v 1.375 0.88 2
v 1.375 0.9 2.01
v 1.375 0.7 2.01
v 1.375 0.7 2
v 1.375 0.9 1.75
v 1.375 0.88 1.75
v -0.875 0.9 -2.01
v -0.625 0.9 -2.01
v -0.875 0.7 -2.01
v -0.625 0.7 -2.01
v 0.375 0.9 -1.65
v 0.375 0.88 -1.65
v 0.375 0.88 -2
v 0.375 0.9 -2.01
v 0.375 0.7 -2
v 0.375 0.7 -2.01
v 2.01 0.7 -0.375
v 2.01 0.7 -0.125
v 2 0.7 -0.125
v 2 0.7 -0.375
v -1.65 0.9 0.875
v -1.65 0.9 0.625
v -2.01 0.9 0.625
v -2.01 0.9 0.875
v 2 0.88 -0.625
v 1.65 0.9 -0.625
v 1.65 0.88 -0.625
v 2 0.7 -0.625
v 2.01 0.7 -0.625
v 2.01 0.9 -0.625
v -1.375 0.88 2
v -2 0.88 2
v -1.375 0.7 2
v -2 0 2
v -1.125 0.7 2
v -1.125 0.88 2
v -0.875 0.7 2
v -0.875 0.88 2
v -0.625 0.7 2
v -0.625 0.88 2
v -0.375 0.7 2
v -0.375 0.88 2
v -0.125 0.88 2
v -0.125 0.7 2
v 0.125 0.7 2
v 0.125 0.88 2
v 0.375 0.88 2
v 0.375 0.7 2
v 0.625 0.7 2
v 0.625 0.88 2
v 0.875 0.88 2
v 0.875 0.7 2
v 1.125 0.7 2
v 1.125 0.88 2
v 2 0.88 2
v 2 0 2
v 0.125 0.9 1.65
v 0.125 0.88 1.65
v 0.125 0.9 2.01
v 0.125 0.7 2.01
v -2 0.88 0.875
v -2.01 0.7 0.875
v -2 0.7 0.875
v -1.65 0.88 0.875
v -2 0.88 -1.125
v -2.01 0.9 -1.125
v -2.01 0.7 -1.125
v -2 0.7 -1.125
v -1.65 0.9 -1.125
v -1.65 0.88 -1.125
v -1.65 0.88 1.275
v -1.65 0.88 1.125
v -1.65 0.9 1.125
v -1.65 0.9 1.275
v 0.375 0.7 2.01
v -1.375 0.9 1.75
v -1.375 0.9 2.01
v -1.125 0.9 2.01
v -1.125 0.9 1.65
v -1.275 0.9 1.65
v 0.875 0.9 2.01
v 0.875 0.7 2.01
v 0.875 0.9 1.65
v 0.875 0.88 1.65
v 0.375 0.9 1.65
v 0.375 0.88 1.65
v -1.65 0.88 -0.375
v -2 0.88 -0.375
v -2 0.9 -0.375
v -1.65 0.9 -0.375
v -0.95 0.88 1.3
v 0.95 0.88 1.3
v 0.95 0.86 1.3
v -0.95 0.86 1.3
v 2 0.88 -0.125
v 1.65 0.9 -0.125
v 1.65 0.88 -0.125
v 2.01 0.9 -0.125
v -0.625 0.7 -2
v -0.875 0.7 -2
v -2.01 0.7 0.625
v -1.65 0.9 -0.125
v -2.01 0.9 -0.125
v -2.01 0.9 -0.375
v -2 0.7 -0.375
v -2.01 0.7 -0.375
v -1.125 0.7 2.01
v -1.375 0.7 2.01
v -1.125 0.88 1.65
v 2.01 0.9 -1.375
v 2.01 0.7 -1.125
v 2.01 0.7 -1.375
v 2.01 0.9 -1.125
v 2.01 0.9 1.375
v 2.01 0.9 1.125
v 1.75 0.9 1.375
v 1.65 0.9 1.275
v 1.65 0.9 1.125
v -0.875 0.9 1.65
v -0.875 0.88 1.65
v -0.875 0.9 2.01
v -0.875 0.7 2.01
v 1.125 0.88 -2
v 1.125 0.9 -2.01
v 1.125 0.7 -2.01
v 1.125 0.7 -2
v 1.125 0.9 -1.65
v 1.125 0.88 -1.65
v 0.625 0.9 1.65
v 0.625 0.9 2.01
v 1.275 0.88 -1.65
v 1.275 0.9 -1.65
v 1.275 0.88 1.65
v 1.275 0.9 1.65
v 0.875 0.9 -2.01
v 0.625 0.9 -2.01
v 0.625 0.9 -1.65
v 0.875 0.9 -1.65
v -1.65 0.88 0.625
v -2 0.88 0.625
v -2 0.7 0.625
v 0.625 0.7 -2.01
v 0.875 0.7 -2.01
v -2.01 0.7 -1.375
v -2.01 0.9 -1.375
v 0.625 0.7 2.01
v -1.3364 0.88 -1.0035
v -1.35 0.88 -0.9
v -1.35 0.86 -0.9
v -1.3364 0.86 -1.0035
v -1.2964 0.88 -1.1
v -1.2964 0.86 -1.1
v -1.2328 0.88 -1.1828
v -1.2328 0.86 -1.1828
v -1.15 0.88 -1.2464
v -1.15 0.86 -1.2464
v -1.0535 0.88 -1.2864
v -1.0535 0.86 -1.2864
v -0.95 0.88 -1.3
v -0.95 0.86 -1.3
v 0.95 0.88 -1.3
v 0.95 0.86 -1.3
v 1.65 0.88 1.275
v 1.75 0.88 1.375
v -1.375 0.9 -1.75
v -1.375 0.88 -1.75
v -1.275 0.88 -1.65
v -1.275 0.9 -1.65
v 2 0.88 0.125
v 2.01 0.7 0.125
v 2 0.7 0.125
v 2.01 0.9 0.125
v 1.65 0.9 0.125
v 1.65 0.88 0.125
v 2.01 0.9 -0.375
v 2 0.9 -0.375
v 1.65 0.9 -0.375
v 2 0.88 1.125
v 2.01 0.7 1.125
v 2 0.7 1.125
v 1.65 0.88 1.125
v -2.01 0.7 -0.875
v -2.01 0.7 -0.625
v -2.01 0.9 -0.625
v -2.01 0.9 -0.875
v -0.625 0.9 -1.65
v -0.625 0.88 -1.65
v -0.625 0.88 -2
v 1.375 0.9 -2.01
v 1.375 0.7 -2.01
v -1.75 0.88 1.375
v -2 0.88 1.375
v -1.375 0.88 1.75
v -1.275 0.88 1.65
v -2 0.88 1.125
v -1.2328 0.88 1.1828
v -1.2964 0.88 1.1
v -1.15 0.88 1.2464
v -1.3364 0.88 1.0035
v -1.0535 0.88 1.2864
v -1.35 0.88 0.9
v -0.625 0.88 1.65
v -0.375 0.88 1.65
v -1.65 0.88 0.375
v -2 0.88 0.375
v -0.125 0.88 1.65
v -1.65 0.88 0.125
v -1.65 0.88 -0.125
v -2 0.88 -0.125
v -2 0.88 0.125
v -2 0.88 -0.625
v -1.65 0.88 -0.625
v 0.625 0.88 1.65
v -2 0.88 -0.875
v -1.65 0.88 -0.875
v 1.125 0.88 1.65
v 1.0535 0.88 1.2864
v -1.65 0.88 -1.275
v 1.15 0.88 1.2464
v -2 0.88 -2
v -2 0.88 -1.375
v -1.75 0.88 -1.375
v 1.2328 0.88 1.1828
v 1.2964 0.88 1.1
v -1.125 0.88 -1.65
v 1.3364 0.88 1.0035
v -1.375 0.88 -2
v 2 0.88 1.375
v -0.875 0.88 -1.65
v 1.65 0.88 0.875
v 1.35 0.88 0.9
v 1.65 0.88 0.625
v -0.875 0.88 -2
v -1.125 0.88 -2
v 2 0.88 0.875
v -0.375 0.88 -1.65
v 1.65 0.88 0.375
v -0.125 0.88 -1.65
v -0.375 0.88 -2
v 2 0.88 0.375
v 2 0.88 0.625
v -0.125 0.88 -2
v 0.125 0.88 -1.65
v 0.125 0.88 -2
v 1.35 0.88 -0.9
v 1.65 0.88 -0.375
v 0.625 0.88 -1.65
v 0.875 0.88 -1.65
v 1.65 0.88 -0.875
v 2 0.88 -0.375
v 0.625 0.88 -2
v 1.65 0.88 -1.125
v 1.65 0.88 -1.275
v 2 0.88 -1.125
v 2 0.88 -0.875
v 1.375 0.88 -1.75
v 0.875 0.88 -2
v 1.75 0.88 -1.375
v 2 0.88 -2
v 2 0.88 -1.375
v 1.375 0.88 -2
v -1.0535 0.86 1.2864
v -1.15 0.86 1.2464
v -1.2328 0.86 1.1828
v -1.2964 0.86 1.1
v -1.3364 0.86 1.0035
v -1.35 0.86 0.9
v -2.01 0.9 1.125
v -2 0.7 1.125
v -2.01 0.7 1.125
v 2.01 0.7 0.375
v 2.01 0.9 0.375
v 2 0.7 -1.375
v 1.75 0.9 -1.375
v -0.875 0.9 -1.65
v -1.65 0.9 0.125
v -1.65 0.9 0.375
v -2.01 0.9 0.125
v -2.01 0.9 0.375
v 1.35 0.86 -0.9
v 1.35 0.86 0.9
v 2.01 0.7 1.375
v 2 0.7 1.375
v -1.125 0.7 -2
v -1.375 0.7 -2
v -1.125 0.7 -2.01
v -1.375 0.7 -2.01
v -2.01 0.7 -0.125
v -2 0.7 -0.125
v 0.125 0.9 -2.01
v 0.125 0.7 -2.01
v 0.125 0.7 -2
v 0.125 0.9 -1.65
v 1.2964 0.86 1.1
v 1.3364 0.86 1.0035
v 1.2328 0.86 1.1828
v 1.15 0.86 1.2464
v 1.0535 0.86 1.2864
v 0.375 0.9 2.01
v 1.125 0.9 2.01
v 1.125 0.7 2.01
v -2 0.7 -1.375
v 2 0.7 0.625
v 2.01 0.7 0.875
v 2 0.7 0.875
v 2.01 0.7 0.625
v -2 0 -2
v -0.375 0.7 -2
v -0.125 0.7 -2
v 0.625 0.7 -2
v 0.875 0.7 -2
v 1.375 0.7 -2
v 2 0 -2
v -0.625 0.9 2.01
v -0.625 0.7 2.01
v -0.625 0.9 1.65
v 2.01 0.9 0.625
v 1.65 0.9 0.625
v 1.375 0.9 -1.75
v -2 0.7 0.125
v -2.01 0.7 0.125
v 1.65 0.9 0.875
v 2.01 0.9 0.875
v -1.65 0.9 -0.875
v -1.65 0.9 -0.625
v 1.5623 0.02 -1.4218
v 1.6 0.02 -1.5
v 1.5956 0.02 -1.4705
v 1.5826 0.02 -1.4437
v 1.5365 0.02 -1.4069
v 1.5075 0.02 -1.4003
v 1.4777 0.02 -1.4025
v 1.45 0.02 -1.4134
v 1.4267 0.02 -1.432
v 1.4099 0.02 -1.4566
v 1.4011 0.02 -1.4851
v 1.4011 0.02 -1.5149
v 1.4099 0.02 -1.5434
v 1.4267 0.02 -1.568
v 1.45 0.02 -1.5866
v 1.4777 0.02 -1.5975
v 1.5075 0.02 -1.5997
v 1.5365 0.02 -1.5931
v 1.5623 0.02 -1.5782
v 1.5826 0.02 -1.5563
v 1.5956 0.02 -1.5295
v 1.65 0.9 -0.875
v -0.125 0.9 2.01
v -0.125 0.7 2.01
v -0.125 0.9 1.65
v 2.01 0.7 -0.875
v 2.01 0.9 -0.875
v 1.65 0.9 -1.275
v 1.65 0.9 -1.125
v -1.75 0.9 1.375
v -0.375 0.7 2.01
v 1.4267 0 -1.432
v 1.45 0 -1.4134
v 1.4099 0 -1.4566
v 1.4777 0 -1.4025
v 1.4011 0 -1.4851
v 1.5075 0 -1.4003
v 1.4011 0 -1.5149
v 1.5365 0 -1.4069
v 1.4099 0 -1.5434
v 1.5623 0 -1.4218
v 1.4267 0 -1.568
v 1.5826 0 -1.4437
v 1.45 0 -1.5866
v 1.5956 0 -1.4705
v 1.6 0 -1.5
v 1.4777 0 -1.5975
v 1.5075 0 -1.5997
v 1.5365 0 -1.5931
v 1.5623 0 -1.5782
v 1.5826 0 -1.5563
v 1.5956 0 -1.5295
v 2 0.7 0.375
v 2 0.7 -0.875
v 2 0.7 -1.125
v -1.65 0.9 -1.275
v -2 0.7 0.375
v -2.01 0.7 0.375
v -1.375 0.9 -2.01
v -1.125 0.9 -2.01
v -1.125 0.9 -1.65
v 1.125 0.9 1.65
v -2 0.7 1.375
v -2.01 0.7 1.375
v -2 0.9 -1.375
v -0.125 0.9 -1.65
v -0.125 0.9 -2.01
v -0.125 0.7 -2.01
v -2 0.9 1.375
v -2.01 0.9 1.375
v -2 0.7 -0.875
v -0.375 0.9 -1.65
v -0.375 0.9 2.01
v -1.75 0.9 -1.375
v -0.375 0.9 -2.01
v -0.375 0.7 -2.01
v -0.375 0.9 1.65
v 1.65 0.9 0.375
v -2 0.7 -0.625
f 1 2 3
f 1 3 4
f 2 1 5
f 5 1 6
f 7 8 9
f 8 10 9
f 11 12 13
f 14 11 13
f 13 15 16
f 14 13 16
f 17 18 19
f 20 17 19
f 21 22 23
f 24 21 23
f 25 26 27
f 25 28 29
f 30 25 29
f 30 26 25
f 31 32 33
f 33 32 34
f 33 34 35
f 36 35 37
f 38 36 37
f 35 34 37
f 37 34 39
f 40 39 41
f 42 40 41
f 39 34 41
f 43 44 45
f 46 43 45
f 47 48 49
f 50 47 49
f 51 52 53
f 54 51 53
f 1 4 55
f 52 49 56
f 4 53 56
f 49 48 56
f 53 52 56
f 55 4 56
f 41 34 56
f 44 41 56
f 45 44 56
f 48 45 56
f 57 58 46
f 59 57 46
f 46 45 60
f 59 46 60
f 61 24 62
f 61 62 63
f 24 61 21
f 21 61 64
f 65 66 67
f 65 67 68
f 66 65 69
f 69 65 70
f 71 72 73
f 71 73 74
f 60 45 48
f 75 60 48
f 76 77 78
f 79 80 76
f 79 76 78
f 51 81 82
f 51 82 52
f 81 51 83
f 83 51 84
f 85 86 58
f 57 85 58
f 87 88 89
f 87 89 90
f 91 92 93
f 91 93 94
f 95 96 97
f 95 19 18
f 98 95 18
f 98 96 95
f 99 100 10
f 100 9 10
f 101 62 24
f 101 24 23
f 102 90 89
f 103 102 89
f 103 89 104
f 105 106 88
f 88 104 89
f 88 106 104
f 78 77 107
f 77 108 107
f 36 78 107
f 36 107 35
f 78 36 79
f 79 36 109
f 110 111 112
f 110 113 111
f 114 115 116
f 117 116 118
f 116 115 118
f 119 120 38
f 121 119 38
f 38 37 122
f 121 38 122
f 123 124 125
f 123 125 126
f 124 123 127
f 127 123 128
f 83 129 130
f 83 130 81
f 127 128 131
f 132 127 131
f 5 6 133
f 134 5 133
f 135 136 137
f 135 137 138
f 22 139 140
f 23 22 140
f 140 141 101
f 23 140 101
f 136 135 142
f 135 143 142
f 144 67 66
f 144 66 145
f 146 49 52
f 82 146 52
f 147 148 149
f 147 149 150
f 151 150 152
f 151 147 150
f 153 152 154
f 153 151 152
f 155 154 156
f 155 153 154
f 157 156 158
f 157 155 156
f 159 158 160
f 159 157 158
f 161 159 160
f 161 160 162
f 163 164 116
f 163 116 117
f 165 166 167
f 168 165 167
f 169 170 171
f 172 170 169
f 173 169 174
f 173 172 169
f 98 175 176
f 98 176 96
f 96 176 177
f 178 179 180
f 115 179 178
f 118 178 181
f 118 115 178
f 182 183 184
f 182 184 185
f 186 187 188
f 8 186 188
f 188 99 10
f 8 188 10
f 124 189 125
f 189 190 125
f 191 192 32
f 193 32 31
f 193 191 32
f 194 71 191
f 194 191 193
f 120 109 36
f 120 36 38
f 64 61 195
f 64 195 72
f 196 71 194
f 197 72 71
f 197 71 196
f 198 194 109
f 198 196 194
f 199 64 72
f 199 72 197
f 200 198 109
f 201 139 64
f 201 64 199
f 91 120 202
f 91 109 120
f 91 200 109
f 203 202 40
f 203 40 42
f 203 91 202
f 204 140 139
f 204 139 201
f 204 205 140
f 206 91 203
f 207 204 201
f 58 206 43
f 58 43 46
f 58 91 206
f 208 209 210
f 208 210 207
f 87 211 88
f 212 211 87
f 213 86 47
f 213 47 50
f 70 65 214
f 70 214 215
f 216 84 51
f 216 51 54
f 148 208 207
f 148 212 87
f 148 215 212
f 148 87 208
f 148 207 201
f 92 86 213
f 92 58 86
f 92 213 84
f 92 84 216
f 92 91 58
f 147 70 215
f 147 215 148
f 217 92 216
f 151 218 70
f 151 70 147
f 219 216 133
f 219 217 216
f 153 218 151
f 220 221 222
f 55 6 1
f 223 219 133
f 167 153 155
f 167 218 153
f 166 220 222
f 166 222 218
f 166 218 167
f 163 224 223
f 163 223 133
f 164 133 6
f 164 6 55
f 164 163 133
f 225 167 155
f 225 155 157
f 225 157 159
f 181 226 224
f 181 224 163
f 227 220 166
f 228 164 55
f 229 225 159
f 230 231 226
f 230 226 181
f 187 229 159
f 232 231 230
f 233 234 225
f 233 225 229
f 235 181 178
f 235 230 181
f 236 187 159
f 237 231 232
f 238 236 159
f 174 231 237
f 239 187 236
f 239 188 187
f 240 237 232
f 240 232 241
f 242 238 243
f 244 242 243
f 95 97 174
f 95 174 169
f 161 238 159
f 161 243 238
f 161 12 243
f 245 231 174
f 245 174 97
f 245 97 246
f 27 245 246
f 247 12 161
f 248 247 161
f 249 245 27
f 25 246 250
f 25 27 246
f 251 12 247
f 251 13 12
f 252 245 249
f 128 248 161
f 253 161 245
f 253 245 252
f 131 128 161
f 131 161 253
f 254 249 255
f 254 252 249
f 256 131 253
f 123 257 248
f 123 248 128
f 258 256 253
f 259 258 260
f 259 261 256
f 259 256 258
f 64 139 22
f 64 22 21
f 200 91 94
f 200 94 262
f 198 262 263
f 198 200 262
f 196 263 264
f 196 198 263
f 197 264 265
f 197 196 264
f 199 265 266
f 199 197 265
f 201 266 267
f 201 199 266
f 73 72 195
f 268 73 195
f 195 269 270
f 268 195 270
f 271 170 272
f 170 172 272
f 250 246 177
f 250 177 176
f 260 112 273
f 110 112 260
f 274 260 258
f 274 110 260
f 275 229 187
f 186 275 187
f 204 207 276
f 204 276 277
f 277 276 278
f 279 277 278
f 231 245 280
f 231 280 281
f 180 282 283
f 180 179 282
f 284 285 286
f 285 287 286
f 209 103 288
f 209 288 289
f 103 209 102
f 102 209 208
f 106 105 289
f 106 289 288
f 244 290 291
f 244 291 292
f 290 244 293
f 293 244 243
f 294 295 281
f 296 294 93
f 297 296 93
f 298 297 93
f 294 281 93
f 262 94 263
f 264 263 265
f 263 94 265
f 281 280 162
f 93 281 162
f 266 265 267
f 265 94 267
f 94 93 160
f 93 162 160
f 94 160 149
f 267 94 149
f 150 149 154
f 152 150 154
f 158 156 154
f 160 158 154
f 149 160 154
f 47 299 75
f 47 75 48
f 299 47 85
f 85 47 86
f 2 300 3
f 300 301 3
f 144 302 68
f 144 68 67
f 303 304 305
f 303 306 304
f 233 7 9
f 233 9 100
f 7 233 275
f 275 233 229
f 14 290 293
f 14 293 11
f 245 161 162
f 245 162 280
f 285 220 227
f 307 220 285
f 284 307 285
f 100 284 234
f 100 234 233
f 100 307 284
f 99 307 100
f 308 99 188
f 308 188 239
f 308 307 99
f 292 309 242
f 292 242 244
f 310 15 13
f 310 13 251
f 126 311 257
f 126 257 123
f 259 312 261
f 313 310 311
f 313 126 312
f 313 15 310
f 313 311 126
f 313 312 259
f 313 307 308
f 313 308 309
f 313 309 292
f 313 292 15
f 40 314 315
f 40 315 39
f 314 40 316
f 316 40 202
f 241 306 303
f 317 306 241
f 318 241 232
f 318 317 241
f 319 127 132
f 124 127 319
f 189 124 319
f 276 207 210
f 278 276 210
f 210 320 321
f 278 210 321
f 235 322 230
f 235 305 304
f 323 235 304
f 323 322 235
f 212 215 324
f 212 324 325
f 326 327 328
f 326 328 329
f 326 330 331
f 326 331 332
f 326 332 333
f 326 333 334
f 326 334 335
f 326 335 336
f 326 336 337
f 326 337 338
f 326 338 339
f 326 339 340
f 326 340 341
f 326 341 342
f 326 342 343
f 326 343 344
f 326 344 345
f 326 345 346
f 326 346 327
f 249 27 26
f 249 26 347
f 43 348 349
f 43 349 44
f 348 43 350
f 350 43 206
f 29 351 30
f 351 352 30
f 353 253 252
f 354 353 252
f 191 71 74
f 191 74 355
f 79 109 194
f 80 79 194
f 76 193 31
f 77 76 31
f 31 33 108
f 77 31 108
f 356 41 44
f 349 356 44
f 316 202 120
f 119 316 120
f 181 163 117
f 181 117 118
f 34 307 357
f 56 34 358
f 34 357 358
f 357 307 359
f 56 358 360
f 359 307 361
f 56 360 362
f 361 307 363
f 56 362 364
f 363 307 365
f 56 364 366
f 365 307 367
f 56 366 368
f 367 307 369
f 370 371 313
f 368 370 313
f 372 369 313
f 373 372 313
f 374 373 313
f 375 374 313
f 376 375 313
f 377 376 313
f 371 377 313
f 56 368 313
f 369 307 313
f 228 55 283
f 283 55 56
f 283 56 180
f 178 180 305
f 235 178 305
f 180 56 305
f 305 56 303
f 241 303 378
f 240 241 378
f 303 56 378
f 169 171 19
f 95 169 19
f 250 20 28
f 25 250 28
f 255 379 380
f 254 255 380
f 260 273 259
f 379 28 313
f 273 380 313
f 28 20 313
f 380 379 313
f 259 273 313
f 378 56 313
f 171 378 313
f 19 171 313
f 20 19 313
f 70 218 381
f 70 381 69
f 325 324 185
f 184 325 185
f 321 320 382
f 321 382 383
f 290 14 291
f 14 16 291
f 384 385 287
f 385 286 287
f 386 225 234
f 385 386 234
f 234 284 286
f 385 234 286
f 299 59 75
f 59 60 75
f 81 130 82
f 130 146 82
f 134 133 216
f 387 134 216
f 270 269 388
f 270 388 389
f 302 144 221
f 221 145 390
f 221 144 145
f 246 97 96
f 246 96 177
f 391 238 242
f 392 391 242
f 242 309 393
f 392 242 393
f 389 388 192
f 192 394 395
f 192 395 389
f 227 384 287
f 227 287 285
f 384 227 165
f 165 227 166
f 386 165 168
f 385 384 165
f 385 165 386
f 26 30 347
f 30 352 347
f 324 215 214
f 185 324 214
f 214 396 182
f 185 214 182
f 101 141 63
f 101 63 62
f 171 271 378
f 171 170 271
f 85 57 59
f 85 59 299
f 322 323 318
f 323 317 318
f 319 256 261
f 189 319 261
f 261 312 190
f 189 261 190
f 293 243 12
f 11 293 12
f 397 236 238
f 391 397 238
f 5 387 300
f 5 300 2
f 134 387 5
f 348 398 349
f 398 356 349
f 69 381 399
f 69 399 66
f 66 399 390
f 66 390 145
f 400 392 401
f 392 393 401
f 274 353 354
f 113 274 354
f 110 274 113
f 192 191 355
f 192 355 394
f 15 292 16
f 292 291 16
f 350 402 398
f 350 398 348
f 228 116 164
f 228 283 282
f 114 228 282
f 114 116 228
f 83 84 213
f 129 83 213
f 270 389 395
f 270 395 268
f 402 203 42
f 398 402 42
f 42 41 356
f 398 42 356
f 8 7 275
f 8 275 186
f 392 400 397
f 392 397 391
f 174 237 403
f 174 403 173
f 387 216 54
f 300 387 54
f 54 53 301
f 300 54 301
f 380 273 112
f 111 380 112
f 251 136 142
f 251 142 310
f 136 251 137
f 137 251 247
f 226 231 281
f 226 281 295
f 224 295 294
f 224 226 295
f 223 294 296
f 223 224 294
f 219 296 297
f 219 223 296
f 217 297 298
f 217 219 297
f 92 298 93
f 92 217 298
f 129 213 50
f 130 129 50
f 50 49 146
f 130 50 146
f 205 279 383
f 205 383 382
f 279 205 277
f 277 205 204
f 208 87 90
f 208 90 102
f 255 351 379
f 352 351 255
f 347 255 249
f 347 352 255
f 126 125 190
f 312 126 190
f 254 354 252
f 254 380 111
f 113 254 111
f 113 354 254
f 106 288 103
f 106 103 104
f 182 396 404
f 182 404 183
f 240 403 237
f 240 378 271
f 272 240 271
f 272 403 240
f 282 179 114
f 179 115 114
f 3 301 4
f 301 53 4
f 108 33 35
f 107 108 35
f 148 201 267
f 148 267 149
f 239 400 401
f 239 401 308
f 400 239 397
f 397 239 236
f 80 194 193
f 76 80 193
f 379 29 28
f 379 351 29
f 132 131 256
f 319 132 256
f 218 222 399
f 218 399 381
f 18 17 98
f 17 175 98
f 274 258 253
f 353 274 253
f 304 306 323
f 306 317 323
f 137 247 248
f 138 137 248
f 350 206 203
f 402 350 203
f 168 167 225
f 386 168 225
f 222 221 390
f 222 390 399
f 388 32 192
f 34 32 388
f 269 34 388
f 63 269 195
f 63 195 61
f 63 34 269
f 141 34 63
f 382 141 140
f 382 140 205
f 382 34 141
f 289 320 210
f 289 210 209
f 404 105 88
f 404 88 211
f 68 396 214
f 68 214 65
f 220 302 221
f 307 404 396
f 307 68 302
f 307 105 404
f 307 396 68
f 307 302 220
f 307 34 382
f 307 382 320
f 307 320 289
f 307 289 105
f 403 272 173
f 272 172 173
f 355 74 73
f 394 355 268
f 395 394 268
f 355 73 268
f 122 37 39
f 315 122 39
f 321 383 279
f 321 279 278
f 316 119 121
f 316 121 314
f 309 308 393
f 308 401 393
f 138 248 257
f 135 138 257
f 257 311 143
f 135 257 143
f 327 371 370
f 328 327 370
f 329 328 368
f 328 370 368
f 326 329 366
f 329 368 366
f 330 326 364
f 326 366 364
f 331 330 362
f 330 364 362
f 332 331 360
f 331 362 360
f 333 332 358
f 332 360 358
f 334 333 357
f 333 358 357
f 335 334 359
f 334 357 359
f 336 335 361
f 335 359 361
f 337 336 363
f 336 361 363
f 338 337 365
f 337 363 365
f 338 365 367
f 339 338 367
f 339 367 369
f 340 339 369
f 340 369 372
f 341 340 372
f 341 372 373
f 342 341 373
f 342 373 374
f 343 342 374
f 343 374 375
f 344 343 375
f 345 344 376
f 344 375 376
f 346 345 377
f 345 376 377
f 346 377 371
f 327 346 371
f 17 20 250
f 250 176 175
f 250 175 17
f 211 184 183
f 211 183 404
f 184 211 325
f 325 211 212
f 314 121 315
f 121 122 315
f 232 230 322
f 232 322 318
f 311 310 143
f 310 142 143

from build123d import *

# Parameters (mm, degrees)
SKETCH1_W                = 4
SKETCH1_H                = 4
BOSS_EXTRUDE1_DEPTH      = 0.88
BOSS_EXTRUDE3_DEPTH      = 0.02
BOSS_EXTRUDE3_DEPTH_BACK = 0.18
CUT_EXTRUDE1_DEPTH       = 0.02
SKETCH4_R                = 0.1
CUT_EXTRUDE2_DEPTH       = 0.02


with BuildPart() as part:
    # Sketch1 → Boss-Extrude1 (new body)
    with BuildSketch(Plane(origin=(0, 0, 0), x_dir=(1, 0, 0), z_dir=(0, 1, 0))):
        Rectangle(SKETCH1_W, SKETCH1_H)
    extrude(amount=BOSS_EXTRUDE1_DEPTH)

    # Sketch2 → Boss-Extrude3 (add, two sides)
    with BuildSketch(Plane(origin=(0, 0.88, 0), x_dir=(1, 0, 0), z_dir=(0, 1, 0))) as boss_extrude3_sk:
        Polygon((2, 1.375012124), (1.750012124, 1.375012124), (1.65, 1.275), (1.65, 1.124992652), (2, 1.124992652), (2.01, 1.124992652), (2.01, 1.375012124), align=None)
        Polygon((2, 0.624996326), (1.65, 0.624996326), (1.65, 0.875015798), (2, 0.875015798), (2.01, 0.875015798), (2.01, 0.624996326), align=None)
        Polygon((2, 0.125), (1.65, 0.125), (1.65, 0.375019472), (2, 0.375019472), (2.01, 0.374998163), (2.01, 0.125), align=None)
        Polygon((2, -0.374996326), (1.65, -0.374996326), (1.65, -0.124976854), (2, -0.124976854), (2.01, -0.124976854), (2.01, -0.374996326), align=None)
        Polygon((2, -0.874992652), (1.65, -0.874992652), (1.65, -0.62497318), (2, -0.62497318), (2.01, -0.62497318), (2.01, -0.874992652), align=None)
        Polygon((2, -1.374988978), (1.75, -1.374988978), (1.65, -1.274988978), (1.65, -1.124969506), (2, -1.124969506), (2.01, -1.124969506), (2.01, -1.374988978), align=None)
        Polygon((-1.375, -2), (-1.375, -2.01), (-1.125, -2.01), (-1.125, -2), (-1.125, -1.65), (-1.275, -1.65), (-1.375, -1.75), align=None)
        Polygon((-2, -1.124969506), (-1.65, -1.124969506), (-1.65, -1.275), (-1.75, -1.375), (-2, -1.374988978), (-2.01, -1.374988978), (-2.01, -1.124969506), align=None)
        Polygon((-2, -0.62497318), (-1.65, -0.62497318), (-1.65, -0.874992652), (-2, -0.874992652), (-2.01, -0.874992652), (-2.01, -0.62497318), align=None)
        Polygon((1.375, -2.01), (1.375, -2), (1.375, -1.75), (1.275, -1.65), (1.125, -1.65), (1.125, -2), (1.125, -2.01), align=None)
        Polygon((-2, -0.124976854), (-1.65, -0.124976854), (-1.65, -0.374996326), (-2, -0.374996326), (-2.01, -0.374996326), (-2.01, -0.124976854), align=None)
        Polygon((-2, 0.375019472), (-1.65, 0.375019472), (-1.65, 0.125), (-2, 0.125), (-2.01, 0.125), (-2.01, 0.374998163), align=None)
        Polygon((-2, 0.875015798), (-1.65, 0.875015798), (-1.65, 0.624996326), (-2, 0.624996326), (-2.01, 0.624996326), (-2.01, 0.875015798), align=None)
        Polygon((-1.65, 1.275), (-1.65, 1.124992652), (-2, 1.124992652), (-2.01, 1.124992652), (-2.01, 1.375012124), (-2, 1.375012124), (-1.75, 1.375), align=None)
        Polygon((1.125, 2.01), (1.125, 2), (1.125, 1.65), (1.275, 1.65), (1.375, 1.75), (1.375, 2), (1.375, 2.01), align=None)
        Polygon((-0.875, -1.65), (-0.875, -2), (-0.875, -2.01), (-0.625, -2.01), (-0.625, -2), (-0.625, -1.65), align=None)
        Polygon((-0.375, -1.65), (-0.375, -2), (-0.375, -2.01), (-0.125, -2.01), (-0.125, -2), (-0.125, -1.65), align=None)
        Polygon((0.125, -1.65), (0.125, -2), (0.125, -2.01), (0.375, -2.01), (0.375, -2), (0.375, -1.65), align=None)
        Polygon((0.625, -1.65), (0.625, -2), (0.625, -2.01), (0.875, -2.01), (0.875, -2), (0.875, -1.65), align=None)
        Polygon((0.875, 1.65), (0.875, 2), (0.875, 2.01), (0.625, 2.01), (0.625, 2), (0.625, 1.65), align=None)
        Polygon((0.375, 1.65), (0.375, 2), (0.375, 2.01), (0.125, 2.01), (0.125, 2), (0.125, 1.65), align=None)
        Polygon((-0.125, 1.65), (-0.125, 2), (-0.125, 2.01), (-0.375, 2.01), (-0.375, 2), (-0.375, 1.65), align=None)
        Polygon((-0.625, 1.65), (-0.625, 2), (-0.625, 2.01), (-0.875, 2.01), (-0.875, 2), (-0.875, 1.65), align=None)
        Polygon((-1.125, 1.65), (-1.125, 2), (-1.125, 2.01), (-1.375, 2.01), (-1.375, 2), (-1.375, 1.75), (-1.275, 1.65), align=None)
    extrude(amount=BOSS_EXTRUDE3_DEPTH)
    extrude(boss_extrude3_sk.sketch, amount=-BOSS_EXTRUDE3_DEPTH_BACK)

    # Sketch3 → Cut-Extrude1 (cut)
    with BuildSketch(Plane(origin=(0, 0.88, 0), x_dir=(1, 0, 0), z_dir=(0, 1, 0))):
        with BuildLine():
            Line((0.95, 1.3), (1.35, 0.9))
            Line((1.35, 0.9), (1.35, -0.9))
            ThreePointArc((1.35, -0.9), (1.232842712, -1.182842712), (0.95, -1.3))
            Line((0.95, -1.3), (-0.95, -1.3))
            ThreePointArc((-0.95, -1.3), (-1.232842712, -1.182842712), (-1.35, -0.9))
            Line((-1.35, -0.9), (-1.35, 0.9))
            ThreePointArc((-1.35, 0.9), (-1.232842712, 1.182842712), (-0.95, 1.3))
            Line((-0.95, 1.3), (0.95, 1.3))
        make_face()
    extrude(amount=-CUT_EXTRUDE1_DEPTH, mode=Mode.SUBTRACT)

    # Sketch4 → Cut-Extrude2 (cut)
    with BuildSketch(Plane.XZ):
        with Locations((1.5, -1.5)):
            Circle(SKETCH4_R)
    extrude(amount=-CUT_EXTRUDE2_DEPTH, mode=Mode.SUBTRACT)


solid = part.part
